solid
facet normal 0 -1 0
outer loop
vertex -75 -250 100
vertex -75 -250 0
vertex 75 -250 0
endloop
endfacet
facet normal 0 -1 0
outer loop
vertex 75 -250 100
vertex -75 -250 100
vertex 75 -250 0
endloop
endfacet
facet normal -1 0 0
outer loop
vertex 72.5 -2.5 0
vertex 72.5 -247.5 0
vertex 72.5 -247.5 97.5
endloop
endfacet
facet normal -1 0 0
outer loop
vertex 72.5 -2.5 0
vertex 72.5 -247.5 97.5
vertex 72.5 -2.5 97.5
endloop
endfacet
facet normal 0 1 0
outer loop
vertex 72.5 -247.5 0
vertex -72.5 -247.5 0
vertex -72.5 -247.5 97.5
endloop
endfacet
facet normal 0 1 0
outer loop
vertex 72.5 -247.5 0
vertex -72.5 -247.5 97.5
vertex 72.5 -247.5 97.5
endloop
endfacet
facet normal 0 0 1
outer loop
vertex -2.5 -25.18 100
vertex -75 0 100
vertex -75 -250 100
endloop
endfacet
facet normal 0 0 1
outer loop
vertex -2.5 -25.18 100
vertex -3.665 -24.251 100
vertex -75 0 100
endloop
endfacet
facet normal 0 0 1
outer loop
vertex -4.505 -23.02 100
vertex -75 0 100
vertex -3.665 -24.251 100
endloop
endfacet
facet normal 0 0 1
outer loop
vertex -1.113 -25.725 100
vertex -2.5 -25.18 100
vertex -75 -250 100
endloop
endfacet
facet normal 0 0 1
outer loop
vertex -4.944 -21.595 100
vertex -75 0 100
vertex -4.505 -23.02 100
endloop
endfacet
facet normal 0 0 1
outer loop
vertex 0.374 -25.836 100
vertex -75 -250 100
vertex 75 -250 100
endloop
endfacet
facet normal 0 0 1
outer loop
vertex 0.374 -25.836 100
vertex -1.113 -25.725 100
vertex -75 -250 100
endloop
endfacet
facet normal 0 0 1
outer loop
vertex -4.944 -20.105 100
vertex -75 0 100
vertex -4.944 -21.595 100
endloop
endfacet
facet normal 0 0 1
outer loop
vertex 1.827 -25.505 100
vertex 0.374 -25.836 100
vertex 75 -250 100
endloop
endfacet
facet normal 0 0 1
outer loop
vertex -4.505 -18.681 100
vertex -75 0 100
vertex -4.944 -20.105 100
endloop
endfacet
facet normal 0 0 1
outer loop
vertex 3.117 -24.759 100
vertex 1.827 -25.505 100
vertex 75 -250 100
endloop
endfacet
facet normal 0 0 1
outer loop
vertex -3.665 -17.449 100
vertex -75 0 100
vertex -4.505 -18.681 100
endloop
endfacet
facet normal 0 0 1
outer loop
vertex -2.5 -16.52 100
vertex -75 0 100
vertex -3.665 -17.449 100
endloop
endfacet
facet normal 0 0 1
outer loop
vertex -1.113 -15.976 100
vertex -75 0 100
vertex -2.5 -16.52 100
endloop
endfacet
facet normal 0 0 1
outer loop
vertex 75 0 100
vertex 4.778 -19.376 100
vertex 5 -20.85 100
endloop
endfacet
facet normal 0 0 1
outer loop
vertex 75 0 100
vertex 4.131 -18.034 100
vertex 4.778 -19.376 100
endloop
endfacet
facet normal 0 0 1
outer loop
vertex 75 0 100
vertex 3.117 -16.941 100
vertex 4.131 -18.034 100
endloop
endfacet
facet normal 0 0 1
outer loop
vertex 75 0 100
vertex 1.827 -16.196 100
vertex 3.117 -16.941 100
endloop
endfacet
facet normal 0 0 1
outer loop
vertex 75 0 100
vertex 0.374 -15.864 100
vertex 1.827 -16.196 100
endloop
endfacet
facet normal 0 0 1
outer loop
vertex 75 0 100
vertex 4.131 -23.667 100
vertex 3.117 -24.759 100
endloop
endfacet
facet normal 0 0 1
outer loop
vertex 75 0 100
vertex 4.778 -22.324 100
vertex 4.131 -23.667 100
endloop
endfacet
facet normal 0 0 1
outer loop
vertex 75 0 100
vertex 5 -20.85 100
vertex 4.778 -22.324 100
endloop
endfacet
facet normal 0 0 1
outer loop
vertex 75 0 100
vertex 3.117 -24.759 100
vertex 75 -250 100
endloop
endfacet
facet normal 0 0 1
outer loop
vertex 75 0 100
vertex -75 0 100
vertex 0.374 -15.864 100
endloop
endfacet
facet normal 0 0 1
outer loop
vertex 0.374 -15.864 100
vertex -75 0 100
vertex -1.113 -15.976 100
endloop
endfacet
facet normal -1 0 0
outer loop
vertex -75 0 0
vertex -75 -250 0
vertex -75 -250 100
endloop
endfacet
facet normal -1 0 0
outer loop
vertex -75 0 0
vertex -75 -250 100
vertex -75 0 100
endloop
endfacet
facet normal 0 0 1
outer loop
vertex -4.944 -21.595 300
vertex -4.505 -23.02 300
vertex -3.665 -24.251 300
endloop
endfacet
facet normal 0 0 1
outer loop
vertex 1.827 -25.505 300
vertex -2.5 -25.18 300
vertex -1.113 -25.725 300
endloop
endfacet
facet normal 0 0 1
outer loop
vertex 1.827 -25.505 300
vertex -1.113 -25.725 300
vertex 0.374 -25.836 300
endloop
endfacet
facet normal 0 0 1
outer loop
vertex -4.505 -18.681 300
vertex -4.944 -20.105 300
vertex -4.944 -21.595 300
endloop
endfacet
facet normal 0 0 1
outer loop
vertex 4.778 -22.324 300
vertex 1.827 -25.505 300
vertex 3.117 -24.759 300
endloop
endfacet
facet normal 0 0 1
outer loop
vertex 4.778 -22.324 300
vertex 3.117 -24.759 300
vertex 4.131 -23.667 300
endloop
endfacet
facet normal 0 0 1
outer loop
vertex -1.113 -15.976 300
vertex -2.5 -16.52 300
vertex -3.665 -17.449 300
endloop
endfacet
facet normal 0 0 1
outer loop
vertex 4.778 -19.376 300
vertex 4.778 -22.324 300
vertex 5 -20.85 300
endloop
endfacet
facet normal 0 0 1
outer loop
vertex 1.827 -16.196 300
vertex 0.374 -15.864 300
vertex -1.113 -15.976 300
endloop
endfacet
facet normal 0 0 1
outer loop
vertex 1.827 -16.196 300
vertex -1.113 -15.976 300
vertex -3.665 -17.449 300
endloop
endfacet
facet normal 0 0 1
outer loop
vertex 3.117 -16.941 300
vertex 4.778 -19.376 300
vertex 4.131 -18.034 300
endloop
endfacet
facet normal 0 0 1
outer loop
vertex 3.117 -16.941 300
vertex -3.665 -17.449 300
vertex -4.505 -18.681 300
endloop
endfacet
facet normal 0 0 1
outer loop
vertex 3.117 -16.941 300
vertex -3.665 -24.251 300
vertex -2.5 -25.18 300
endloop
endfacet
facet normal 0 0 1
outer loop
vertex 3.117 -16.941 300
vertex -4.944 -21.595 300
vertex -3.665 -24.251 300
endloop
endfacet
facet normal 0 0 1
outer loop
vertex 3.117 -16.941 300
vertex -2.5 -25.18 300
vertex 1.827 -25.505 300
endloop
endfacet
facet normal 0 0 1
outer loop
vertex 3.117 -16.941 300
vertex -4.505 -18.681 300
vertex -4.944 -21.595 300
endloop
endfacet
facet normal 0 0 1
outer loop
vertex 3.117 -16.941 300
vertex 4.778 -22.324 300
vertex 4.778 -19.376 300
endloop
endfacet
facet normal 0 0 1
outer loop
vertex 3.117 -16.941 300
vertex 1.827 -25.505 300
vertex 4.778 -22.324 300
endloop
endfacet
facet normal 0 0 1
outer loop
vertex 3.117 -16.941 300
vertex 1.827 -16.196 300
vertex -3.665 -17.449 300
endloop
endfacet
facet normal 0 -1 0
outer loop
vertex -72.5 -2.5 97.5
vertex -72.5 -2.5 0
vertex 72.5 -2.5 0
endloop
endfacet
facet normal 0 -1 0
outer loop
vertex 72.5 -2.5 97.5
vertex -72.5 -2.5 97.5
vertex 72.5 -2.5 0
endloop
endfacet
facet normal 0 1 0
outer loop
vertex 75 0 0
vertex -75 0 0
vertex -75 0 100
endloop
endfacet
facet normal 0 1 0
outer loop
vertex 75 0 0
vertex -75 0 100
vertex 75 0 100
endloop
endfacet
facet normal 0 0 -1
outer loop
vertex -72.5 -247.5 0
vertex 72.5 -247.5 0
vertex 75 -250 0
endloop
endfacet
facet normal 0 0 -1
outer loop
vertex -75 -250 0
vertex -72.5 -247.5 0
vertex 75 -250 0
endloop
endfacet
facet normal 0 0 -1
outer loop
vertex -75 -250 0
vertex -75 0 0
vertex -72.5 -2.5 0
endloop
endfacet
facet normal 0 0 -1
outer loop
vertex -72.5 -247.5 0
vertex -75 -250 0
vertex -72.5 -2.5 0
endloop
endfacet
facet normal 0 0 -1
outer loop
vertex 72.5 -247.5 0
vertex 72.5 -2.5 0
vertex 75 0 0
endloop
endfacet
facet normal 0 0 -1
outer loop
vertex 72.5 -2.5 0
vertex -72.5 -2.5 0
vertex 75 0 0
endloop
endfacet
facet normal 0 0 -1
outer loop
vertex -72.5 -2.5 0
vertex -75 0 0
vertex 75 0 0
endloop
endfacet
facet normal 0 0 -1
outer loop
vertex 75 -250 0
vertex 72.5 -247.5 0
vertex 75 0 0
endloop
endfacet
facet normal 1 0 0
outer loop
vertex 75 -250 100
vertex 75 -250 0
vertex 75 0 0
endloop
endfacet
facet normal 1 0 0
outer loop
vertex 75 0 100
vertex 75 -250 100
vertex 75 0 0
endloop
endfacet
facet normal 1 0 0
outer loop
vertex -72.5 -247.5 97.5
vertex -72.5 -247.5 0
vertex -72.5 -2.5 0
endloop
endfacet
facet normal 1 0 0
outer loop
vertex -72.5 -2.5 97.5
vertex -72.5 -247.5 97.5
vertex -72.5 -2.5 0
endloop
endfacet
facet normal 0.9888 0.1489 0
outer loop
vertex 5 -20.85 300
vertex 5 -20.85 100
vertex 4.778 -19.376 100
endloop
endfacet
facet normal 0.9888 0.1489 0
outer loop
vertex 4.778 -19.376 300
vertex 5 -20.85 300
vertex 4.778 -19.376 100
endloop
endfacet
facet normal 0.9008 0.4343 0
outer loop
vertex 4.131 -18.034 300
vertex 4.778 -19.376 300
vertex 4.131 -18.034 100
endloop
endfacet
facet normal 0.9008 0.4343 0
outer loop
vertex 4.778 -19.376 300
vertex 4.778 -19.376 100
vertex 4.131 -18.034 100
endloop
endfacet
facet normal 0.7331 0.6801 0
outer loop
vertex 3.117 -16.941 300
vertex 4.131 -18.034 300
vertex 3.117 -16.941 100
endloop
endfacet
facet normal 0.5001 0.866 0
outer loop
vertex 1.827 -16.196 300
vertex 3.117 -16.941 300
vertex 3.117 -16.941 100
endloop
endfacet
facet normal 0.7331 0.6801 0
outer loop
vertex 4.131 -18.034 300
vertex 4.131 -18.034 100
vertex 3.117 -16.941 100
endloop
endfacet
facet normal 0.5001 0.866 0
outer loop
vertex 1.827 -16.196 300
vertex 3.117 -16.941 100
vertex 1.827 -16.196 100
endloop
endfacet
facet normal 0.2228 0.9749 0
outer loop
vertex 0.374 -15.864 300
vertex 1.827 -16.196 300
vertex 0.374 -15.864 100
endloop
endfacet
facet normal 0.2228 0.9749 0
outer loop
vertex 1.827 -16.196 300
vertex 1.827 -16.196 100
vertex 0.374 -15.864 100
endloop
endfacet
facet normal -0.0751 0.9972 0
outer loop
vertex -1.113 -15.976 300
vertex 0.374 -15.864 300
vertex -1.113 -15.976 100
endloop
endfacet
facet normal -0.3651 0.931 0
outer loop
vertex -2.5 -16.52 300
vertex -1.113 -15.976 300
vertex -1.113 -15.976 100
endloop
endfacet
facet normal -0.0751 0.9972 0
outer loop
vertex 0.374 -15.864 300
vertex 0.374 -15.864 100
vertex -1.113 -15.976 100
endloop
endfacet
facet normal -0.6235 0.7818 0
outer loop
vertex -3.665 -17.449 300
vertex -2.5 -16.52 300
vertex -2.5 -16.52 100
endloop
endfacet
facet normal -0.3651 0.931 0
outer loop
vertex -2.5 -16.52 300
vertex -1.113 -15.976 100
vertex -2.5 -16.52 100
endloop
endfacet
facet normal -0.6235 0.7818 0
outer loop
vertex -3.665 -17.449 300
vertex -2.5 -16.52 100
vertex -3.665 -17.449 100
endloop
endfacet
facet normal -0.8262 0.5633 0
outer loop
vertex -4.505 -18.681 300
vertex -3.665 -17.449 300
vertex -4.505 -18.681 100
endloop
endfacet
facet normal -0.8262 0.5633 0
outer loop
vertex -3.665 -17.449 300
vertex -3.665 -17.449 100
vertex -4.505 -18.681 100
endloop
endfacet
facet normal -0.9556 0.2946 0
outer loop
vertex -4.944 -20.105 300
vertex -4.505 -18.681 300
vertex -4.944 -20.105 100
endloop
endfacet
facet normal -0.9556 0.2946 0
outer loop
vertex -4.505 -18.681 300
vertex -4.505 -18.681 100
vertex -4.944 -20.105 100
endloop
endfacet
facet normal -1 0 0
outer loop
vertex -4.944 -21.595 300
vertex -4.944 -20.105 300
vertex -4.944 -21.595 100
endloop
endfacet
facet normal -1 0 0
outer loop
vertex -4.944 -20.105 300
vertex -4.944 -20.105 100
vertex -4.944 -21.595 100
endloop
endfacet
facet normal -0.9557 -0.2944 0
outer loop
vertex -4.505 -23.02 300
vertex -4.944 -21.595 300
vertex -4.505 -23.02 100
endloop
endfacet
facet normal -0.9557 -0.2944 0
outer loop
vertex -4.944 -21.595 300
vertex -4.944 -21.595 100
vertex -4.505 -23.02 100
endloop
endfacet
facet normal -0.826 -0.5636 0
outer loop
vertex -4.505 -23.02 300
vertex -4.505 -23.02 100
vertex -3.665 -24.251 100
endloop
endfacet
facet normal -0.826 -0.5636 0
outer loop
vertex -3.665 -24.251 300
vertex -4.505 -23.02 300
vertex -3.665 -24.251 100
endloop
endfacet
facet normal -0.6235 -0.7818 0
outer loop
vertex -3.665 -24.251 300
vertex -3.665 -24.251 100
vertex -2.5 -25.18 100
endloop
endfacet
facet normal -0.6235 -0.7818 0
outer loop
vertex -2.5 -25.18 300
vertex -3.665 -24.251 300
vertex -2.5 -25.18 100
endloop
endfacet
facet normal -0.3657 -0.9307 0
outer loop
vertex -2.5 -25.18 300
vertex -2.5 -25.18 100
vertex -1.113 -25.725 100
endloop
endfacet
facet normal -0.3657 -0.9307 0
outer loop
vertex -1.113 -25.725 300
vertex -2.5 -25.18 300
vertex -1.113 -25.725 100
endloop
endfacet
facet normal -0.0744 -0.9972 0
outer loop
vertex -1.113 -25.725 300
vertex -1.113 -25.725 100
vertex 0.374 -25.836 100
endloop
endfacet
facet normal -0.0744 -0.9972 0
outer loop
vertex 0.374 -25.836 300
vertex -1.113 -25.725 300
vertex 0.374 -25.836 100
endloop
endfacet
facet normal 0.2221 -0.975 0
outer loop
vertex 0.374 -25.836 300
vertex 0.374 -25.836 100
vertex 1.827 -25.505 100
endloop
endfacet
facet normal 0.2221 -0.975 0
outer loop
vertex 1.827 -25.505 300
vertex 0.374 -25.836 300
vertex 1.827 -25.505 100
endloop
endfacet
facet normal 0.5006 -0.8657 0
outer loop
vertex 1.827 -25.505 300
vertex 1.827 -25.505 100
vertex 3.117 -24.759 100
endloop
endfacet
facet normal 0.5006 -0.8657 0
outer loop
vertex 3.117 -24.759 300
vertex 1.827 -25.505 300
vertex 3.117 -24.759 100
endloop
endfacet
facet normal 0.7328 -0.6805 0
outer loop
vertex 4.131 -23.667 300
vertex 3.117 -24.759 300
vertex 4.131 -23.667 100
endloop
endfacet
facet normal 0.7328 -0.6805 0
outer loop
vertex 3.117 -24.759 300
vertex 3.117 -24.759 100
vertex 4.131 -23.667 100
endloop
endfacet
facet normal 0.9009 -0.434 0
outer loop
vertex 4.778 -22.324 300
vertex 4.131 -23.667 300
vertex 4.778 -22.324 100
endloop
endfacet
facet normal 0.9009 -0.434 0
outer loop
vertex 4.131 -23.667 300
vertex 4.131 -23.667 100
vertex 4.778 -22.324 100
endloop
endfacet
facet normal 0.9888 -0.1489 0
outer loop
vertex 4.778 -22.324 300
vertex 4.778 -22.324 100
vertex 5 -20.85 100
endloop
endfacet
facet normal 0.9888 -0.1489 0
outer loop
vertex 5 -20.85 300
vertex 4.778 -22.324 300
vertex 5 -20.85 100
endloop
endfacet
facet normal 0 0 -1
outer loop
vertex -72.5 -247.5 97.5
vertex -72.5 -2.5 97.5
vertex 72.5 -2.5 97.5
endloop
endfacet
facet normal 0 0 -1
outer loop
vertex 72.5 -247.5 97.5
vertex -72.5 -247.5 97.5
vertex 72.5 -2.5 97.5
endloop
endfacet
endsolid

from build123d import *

# Parameters (mm, degrees)
F0_W     = 150
F0_H     = 250
F1_DEPTH = 100
F2_T     = -2.5
F3_R     = 5
F4_DEPTH = 200


with BuildPart() as f1:
    # F0 (on Top) → F1 (new body)
    with BuildSketch(Plane.XY):
        with Locations((0, -125)):
            Rectangle(F0_W, F0_H)
    extrude(amount=F1_DEPTH)

    # F2
    f2_openings = [f1.faces().sort_by_distance(p)[0] for p in [
        (0, -125, 0),
    ]]
    offset(amount=F2_T, openings=f2_openings)

    # F3 (on face) → F4 (join)
    with BuildSketch(Plane.XY.offset(100)):
        with Locations((0, -20.85017)):
            Circle(F3_R)
    extrude(amount=F4_DEPTH)


solid = f1.part
